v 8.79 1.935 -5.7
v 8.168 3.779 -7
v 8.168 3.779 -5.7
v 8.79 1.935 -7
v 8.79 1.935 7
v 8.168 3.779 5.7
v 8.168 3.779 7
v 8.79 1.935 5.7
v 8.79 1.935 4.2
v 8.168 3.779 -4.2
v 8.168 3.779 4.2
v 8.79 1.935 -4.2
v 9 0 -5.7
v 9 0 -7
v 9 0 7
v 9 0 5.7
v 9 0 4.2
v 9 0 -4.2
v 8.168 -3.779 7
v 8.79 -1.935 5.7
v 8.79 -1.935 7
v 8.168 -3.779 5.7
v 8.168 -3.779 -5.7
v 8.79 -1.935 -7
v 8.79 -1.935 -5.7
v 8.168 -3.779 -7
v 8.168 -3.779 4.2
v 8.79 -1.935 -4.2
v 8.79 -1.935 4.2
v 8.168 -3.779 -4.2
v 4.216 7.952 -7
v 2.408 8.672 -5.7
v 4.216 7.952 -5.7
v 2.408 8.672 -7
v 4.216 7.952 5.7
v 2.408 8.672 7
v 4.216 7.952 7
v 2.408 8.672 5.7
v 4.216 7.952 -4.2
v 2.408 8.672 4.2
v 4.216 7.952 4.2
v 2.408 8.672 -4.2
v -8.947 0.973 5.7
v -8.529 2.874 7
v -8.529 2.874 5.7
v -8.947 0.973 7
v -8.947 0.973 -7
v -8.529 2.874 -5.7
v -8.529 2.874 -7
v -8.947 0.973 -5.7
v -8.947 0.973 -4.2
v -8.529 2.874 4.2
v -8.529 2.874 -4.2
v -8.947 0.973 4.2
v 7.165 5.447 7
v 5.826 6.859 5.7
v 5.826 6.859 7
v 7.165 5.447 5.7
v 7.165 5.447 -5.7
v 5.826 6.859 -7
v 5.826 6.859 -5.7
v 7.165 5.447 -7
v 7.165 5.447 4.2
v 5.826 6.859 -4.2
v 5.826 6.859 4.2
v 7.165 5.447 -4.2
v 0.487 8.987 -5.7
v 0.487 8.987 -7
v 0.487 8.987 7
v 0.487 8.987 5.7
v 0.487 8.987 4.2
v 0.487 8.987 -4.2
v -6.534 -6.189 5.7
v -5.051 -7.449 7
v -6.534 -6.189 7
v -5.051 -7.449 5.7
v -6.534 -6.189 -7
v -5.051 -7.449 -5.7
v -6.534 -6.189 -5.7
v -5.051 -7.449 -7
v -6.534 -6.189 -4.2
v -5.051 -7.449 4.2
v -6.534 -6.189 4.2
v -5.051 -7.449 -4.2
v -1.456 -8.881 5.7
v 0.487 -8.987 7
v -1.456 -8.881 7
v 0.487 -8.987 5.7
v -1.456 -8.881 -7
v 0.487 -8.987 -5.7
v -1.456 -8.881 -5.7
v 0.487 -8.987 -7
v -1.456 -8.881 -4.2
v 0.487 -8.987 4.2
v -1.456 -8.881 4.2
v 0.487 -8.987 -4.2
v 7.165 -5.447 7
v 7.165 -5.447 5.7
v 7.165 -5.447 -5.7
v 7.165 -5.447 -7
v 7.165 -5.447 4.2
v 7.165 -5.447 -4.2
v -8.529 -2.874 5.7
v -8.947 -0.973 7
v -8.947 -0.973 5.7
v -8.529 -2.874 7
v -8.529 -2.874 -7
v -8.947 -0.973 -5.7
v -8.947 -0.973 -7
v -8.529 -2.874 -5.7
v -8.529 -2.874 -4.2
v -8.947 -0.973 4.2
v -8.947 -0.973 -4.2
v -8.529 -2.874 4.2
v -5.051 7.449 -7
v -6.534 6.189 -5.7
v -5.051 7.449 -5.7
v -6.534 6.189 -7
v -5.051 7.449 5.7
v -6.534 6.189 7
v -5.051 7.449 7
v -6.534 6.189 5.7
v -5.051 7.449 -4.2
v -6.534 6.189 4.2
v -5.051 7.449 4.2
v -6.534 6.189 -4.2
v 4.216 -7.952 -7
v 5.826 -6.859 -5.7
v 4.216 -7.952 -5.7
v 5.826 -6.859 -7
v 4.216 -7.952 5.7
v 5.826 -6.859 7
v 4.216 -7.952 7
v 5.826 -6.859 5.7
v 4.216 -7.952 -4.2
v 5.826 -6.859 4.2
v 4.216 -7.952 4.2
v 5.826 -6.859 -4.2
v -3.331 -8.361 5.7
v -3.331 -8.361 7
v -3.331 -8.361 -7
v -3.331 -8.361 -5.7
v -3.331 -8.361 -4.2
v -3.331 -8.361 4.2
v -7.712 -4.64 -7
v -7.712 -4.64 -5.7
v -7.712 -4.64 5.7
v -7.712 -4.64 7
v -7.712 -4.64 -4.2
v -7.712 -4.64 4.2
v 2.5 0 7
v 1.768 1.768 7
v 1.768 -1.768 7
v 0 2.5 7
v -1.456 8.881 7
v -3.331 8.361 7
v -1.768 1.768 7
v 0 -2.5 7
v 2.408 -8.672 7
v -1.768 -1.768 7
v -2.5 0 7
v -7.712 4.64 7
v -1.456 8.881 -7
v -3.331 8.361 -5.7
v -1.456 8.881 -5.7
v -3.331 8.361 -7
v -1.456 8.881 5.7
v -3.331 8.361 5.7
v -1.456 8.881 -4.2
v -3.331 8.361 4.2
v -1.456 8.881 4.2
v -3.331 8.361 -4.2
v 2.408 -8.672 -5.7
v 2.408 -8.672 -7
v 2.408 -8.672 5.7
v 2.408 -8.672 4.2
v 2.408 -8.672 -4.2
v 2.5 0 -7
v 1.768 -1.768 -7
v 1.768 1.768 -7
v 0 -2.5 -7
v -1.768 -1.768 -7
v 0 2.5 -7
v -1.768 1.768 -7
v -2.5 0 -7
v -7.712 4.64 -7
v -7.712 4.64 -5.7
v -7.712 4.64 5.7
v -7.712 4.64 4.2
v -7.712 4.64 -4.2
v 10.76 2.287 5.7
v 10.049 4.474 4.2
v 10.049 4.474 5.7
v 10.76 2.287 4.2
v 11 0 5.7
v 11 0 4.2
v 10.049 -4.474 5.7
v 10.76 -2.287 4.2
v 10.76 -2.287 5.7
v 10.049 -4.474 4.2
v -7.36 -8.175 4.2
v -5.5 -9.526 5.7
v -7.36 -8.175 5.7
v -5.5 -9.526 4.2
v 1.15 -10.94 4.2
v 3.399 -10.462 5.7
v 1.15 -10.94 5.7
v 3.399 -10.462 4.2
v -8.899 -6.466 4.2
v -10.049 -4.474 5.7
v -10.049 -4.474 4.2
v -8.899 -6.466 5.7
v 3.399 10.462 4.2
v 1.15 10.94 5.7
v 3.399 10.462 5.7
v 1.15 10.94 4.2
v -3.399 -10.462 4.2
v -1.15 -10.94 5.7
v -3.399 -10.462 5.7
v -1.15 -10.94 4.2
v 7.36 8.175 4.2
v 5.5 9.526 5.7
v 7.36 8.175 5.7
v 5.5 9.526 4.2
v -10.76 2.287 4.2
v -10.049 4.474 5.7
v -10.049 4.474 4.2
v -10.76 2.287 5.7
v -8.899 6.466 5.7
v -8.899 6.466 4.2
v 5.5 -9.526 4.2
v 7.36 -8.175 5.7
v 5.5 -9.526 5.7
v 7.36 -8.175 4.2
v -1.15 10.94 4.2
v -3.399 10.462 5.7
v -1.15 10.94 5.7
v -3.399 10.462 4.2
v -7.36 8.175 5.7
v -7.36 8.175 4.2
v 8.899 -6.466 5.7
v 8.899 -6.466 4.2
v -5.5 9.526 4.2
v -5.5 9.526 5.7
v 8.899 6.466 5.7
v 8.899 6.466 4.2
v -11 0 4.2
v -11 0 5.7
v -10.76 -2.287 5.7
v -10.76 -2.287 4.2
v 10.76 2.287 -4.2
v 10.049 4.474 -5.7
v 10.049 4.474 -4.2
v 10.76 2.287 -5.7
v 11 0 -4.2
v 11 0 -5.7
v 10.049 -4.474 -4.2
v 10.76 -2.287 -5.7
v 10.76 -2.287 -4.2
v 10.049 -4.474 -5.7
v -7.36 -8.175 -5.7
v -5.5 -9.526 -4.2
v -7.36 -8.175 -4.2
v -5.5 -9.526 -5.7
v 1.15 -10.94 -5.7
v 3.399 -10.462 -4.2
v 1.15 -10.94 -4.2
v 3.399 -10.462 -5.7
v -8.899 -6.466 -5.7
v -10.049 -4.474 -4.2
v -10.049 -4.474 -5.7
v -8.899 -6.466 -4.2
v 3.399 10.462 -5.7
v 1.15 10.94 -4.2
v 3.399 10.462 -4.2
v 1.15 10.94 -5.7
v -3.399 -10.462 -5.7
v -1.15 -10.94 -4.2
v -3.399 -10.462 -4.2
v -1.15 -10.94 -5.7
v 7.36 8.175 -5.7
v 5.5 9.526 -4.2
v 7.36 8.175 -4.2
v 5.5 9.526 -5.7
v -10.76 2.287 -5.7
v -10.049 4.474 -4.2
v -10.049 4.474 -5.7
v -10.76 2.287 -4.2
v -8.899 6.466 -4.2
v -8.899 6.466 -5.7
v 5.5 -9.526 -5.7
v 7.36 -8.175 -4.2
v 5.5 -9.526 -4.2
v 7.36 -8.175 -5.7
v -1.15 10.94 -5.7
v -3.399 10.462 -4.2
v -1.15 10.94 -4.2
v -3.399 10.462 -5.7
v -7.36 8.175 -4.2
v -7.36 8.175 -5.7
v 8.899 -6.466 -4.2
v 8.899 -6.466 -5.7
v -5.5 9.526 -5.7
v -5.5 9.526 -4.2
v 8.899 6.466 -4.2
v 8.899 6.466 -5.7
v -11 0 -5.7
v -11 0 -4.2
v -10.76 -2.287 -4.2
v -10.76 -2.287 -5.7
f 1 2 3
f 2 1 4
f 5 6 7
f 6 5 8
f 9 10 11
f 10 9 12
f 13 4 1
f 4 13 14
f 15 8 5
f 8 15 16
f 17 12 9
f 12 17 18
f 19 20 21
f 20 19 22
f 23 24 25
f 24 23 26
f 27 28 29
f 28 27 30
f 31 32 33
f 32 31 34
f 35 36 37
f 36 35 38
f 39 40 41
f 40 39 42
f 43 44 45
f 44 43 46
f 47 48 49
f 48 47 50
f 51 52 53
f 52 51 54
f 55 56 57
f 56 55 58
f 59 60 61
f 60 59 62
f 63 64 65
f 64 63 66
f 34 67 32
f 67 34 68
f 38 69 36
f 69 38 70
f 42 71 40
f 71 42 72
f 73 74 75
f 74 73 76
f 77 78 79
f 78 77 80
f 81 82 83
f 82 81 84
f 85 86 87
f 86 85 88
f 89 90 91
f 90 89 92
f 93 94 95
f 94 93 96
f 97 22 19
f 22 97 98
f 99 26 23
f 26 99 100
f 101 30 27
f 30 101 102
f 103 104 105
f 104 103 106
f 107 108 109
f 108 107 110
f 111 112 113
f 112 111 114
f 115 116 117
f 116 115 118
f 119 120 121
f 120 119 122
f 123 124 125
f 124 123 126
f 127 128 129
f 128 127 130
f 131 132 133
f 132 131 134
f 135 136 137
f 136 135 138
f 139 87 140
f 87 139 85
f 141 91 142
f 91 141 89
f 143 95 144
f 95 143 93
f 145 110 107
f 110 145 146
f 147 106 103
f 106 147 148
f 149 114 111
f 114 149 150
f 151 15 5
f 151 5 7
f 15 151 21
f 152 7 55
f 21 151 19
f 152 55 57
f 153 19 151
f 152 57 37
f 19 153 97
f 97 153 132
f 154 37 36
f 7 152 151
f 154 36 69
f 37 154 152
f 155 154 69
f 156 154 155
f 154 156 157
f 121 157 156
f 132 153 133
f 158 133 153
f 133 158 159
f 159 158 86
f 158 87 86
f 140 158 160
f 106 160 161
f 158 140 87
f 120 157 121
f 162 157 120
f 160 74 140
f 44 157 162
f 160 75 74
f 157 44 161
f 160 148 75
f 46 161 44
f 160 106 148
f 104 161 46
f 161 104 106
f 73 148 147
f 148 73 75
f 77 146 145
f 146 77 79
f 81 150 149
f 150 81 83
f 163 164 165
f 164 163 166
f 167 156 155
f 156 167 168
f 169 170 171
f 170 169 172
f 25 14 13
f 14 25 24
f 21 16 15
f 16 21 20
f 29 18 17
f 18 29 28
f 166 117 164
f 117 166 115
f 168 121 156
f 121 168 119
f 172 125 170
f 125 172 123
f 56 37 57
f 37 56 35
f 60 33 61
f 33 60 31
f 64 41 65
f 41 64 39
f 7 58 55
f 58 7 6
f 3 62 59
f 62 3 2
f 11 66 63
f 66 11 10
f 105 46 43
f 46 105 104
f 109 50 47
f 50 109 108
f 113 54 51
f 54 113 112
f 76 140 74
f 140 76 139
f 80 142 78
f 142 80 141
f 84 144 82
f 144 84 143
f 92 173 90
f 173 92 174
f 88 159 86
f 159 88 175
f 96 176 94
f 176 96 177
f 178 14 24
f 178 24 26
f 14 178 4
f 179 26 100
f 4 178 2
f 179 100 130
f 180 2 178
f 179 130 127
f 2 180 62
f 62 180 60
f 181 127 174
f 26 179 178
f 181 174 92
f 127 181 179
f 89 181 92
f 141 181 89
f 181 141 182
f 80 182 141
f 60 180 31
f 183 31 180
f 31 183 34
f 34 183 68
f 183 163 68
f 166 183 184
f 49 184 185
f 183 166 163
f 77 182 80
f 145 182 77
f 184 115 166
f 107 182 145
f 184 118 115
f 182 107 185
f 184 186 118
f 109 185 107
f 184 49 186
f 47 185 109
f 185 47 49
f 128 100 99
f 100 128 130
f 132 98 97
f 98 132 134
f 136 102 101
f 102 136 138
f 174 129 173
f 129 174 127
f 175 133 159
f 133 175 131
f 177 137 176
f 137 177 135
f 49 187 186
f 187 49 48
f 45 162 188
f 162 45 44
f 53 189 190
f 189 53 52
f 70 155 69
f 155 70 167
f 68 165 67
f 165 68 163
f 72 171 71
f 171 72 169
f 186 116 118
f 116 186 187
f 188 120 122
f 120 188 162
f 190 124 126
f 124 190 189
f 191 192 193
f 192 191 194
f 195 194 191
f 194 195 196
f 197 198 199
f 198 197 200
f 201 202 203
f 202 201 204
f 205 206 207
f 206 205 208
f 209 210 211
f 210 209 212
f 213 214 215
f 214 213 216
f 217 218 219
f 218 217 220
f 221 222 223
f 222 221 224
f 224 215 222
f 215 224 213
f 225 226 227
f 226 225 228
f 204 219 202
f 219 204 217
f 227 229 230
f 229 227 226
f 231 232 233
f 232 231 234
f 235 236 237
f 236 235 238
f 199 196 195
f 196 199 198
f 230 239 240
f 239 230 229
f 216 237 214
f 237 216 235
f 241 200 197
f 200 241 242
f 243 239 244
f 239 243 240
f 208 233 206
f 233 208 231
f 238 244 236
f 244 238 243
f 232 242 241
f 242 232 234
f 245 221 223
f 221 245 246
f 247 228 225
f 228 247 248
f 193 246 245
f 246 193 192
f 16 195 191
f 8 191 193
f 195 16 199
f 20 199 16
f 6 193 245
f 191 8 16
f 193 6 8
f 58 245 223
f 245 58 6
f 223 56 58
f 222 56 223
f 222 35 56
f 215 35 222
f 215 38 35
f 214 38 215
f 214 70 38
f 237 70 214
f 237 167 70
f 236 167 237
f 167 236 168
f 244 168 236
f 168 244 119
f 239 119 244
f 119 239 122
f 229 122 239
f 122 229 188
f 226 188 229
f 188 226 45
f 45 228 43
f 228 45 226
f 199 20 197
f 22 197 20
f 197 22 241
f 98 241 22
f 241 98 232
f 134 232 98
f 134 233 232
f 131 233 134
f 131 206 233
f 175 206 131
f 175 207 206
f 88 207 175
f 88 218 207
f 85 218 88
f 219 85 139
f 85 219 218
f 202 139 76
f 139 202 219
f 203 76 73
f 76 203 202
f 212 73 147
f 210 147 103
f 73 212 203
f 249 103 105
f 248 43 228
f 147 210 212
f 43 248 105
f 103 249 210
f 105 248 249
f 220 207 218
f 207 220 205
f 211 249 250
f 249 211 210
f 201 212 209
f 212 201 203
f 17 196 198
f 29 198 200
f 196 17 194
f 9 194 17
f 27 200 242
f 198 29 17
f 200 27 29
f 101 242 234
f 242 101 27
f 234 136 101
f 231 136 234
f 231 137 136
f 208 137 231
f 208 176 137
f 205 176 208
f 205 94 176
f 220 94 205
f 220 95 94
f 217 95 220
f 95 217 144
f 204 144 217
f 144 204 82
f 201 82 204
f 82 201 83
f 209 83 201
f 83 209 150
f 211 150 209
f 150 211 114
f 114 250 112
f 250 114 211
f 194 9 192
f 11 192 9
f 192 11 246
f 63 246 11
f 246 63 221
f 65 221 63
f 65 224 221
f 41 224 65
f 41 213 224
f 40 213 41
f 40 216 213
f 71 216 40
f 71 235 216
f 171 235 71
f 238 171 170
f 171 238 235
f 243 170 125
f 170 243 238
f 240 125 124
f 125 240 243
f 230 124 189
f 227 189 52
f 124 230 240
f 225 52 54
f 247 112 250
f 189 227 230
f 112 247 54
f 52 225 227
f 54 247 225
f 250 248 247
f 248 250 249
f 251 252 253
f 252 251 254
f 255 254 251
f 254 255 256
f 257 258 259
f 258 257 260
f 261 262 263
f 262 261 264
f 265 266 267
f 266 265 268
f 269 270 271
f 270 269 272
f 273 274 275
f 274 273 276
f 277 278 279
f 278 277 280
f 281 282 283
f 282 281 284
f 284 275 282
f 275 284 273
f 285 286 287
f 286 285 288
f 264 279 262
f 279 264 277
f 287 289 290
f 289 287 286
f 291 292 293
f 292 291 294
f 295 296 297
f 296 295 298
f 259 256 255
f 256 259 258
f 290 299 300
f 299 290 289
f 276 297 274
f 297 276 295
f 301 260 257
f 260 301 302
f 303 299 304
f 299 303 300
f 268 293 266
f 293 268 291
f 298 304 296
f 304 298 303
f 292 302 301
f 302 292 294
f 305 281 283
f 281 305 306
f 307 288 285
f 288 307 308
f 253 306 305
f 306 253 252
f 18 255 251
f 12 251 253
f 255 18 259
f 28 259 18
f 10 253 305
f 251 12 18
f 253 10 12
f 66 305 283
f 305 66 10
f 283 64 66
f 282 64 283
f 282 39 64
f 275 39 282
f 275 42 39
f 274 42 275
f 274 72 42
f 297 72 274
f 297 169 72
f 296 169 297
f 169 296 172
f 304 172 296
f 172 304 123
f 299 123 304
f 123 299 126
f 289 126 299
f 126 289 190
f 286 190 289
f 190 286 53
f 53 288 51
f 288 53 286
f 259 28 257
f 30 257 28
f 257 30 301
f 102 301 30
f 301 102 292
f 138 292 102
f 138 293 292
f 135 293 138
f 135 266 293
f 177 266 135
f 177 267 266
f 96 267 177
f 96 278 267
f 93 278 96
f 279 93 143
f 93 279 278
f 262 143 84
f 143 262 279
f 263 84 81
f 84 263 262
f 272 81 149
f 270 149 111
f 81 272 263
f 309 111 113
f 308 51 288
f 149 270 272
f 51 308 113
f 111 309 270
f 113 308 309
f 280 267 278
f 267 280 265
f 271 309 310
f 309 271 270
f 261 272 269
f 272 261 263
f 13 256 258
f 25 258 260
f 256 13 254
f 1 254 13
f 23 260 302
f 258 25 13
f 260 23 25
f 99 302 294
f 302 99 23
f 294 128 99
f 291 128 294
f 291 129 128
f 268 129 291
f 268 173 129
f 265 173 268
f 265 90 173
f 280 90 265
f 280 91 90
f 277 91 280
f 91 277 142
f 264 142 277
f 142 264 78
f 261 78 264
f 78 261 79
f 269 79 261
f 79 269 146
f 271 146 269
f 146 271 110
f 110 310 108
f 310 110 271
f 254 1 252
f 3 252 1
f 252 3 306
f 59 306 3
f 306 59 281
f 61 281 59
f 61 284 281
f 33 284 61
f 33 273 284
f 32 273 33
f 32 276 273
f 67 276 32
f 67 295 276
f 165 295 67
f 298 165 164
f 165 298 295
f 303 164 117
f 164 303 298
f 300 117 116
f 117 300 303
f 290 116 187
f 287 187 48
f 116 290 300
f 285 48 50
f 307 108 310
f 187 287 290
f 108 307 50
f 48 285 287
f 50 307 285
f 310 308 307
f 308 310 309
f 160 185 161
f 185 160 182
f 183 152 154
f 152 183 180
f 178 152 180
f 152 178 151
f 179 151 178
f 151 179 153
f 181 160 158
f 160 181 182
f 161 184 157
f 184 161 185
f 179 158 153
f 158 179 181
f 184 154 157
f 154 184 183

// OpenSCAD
// Parameters
tooth_count = 20; //[10:60:1]
pitch_diameter_mm = 12.22; //[6.11:24.44:0.01]
pitch_radius_mm = 6.11; //[3.055:12.22:0.01]
pulley_width_mm = 10; //[5:30:1]
tooth_pitch_mm_derived = 1.919513102640804; //[0.959756551320402:3.839026205281608:0.0001]
tooth_radial_height_mm = 1.2; //[0.6:2.4:0.05]
tooth_tangential_width_mm = 1.2; //[0.6:2.4:0.05]
tooth_overlap_mm = 0.8; //[0.3:1.5:0.05]
root_clearance_mm = 0.6; //[0.2:1.5:0.05]
hub_diameter_mm = 18; //[9:36:0.5]
hub_length_mm = 14; //[7:28:1]
bore_diameter_mm = 5; //[2:12:0.1]
flange_diameter_mm = 22; //[12:44:0.5]
flange_thickness_mm = 1.5; //[0.8:4:0.1]
eps_mm = 0.8; //[0.2:2:0.1]

// Pulley - complete geometry
module pulley() {
  color("Silver") {
    union() {
      // Toothed pulley body
      cylinder(r=pitch_radius_mm - root_clearance_mm, h=pulley_width_mm, center=true);
      
      // Hub
      cylinder(r=hub_diameter_mm/2, h=hub_length_mm, center=true);
      
      // Flanges
      translate([0, 0, pulley_width_mm/2 + flange_thickness_mm/2 - eps_mm])
        cylinder(r=flange_diameter_mm/2, h=flange_thickness_mm, center=true);
      translate([0, 0, -pulley_width_mm/2 - flange_thickness_mm/2 + eps_mm])
        cylinder(r=flange_diameter_mm/2, h=flange_thickness_mm, center=true);
    }
  }
}

// Printed Pulley Teeth - complete geometry
module printed_pulley_teeth() {
  for (i = [0:tooth_count-1]) {
    rotate([0, 0, i*360/tooth_count]) {
      translate([pitch_radius_mm - root_clearance_mm + (tooth_radial_height_mm + tooth_overlap_mm)/2 - tooth_overlap_mm, 0, 0])
        cube([tooth_radial_height_mm + tooth_overlap_mm, tooth_tangential_width_mm, pulley_width_mm], center=true);
    }
  }
}

// Printed Pulley GT2 Teeth - complete geometry
module printed_pulley_GT2_teeth() {
  union() {
    printed_pulley_teeth();
    cylinder(r=pitch_radius_mm, h=eps_mm, center=true);
  }
}

// Printed Pulley Teeth From Profile - complete geometry
module printed_pulley_teeth_from_profile() {
  union() {
    printed_pulley_GT2_teeth();
    cylinder(r=pitch_radius_mm - root_clearance_mm, h=pulley_width_mm, center=true);
  }
}

// Assembly
module assembly() {
  difference() {
    union() {
      printed_pulley_teeth_from_profile();
      pulley();
    }
    // Bore hole
    cylinder(r=bore_diameter_mm/2, h=hub_length_mm + 2*flange_thickness_mm + pulley_width_mm + 4*eps_mm, center=true);
  }
}

assembly();
